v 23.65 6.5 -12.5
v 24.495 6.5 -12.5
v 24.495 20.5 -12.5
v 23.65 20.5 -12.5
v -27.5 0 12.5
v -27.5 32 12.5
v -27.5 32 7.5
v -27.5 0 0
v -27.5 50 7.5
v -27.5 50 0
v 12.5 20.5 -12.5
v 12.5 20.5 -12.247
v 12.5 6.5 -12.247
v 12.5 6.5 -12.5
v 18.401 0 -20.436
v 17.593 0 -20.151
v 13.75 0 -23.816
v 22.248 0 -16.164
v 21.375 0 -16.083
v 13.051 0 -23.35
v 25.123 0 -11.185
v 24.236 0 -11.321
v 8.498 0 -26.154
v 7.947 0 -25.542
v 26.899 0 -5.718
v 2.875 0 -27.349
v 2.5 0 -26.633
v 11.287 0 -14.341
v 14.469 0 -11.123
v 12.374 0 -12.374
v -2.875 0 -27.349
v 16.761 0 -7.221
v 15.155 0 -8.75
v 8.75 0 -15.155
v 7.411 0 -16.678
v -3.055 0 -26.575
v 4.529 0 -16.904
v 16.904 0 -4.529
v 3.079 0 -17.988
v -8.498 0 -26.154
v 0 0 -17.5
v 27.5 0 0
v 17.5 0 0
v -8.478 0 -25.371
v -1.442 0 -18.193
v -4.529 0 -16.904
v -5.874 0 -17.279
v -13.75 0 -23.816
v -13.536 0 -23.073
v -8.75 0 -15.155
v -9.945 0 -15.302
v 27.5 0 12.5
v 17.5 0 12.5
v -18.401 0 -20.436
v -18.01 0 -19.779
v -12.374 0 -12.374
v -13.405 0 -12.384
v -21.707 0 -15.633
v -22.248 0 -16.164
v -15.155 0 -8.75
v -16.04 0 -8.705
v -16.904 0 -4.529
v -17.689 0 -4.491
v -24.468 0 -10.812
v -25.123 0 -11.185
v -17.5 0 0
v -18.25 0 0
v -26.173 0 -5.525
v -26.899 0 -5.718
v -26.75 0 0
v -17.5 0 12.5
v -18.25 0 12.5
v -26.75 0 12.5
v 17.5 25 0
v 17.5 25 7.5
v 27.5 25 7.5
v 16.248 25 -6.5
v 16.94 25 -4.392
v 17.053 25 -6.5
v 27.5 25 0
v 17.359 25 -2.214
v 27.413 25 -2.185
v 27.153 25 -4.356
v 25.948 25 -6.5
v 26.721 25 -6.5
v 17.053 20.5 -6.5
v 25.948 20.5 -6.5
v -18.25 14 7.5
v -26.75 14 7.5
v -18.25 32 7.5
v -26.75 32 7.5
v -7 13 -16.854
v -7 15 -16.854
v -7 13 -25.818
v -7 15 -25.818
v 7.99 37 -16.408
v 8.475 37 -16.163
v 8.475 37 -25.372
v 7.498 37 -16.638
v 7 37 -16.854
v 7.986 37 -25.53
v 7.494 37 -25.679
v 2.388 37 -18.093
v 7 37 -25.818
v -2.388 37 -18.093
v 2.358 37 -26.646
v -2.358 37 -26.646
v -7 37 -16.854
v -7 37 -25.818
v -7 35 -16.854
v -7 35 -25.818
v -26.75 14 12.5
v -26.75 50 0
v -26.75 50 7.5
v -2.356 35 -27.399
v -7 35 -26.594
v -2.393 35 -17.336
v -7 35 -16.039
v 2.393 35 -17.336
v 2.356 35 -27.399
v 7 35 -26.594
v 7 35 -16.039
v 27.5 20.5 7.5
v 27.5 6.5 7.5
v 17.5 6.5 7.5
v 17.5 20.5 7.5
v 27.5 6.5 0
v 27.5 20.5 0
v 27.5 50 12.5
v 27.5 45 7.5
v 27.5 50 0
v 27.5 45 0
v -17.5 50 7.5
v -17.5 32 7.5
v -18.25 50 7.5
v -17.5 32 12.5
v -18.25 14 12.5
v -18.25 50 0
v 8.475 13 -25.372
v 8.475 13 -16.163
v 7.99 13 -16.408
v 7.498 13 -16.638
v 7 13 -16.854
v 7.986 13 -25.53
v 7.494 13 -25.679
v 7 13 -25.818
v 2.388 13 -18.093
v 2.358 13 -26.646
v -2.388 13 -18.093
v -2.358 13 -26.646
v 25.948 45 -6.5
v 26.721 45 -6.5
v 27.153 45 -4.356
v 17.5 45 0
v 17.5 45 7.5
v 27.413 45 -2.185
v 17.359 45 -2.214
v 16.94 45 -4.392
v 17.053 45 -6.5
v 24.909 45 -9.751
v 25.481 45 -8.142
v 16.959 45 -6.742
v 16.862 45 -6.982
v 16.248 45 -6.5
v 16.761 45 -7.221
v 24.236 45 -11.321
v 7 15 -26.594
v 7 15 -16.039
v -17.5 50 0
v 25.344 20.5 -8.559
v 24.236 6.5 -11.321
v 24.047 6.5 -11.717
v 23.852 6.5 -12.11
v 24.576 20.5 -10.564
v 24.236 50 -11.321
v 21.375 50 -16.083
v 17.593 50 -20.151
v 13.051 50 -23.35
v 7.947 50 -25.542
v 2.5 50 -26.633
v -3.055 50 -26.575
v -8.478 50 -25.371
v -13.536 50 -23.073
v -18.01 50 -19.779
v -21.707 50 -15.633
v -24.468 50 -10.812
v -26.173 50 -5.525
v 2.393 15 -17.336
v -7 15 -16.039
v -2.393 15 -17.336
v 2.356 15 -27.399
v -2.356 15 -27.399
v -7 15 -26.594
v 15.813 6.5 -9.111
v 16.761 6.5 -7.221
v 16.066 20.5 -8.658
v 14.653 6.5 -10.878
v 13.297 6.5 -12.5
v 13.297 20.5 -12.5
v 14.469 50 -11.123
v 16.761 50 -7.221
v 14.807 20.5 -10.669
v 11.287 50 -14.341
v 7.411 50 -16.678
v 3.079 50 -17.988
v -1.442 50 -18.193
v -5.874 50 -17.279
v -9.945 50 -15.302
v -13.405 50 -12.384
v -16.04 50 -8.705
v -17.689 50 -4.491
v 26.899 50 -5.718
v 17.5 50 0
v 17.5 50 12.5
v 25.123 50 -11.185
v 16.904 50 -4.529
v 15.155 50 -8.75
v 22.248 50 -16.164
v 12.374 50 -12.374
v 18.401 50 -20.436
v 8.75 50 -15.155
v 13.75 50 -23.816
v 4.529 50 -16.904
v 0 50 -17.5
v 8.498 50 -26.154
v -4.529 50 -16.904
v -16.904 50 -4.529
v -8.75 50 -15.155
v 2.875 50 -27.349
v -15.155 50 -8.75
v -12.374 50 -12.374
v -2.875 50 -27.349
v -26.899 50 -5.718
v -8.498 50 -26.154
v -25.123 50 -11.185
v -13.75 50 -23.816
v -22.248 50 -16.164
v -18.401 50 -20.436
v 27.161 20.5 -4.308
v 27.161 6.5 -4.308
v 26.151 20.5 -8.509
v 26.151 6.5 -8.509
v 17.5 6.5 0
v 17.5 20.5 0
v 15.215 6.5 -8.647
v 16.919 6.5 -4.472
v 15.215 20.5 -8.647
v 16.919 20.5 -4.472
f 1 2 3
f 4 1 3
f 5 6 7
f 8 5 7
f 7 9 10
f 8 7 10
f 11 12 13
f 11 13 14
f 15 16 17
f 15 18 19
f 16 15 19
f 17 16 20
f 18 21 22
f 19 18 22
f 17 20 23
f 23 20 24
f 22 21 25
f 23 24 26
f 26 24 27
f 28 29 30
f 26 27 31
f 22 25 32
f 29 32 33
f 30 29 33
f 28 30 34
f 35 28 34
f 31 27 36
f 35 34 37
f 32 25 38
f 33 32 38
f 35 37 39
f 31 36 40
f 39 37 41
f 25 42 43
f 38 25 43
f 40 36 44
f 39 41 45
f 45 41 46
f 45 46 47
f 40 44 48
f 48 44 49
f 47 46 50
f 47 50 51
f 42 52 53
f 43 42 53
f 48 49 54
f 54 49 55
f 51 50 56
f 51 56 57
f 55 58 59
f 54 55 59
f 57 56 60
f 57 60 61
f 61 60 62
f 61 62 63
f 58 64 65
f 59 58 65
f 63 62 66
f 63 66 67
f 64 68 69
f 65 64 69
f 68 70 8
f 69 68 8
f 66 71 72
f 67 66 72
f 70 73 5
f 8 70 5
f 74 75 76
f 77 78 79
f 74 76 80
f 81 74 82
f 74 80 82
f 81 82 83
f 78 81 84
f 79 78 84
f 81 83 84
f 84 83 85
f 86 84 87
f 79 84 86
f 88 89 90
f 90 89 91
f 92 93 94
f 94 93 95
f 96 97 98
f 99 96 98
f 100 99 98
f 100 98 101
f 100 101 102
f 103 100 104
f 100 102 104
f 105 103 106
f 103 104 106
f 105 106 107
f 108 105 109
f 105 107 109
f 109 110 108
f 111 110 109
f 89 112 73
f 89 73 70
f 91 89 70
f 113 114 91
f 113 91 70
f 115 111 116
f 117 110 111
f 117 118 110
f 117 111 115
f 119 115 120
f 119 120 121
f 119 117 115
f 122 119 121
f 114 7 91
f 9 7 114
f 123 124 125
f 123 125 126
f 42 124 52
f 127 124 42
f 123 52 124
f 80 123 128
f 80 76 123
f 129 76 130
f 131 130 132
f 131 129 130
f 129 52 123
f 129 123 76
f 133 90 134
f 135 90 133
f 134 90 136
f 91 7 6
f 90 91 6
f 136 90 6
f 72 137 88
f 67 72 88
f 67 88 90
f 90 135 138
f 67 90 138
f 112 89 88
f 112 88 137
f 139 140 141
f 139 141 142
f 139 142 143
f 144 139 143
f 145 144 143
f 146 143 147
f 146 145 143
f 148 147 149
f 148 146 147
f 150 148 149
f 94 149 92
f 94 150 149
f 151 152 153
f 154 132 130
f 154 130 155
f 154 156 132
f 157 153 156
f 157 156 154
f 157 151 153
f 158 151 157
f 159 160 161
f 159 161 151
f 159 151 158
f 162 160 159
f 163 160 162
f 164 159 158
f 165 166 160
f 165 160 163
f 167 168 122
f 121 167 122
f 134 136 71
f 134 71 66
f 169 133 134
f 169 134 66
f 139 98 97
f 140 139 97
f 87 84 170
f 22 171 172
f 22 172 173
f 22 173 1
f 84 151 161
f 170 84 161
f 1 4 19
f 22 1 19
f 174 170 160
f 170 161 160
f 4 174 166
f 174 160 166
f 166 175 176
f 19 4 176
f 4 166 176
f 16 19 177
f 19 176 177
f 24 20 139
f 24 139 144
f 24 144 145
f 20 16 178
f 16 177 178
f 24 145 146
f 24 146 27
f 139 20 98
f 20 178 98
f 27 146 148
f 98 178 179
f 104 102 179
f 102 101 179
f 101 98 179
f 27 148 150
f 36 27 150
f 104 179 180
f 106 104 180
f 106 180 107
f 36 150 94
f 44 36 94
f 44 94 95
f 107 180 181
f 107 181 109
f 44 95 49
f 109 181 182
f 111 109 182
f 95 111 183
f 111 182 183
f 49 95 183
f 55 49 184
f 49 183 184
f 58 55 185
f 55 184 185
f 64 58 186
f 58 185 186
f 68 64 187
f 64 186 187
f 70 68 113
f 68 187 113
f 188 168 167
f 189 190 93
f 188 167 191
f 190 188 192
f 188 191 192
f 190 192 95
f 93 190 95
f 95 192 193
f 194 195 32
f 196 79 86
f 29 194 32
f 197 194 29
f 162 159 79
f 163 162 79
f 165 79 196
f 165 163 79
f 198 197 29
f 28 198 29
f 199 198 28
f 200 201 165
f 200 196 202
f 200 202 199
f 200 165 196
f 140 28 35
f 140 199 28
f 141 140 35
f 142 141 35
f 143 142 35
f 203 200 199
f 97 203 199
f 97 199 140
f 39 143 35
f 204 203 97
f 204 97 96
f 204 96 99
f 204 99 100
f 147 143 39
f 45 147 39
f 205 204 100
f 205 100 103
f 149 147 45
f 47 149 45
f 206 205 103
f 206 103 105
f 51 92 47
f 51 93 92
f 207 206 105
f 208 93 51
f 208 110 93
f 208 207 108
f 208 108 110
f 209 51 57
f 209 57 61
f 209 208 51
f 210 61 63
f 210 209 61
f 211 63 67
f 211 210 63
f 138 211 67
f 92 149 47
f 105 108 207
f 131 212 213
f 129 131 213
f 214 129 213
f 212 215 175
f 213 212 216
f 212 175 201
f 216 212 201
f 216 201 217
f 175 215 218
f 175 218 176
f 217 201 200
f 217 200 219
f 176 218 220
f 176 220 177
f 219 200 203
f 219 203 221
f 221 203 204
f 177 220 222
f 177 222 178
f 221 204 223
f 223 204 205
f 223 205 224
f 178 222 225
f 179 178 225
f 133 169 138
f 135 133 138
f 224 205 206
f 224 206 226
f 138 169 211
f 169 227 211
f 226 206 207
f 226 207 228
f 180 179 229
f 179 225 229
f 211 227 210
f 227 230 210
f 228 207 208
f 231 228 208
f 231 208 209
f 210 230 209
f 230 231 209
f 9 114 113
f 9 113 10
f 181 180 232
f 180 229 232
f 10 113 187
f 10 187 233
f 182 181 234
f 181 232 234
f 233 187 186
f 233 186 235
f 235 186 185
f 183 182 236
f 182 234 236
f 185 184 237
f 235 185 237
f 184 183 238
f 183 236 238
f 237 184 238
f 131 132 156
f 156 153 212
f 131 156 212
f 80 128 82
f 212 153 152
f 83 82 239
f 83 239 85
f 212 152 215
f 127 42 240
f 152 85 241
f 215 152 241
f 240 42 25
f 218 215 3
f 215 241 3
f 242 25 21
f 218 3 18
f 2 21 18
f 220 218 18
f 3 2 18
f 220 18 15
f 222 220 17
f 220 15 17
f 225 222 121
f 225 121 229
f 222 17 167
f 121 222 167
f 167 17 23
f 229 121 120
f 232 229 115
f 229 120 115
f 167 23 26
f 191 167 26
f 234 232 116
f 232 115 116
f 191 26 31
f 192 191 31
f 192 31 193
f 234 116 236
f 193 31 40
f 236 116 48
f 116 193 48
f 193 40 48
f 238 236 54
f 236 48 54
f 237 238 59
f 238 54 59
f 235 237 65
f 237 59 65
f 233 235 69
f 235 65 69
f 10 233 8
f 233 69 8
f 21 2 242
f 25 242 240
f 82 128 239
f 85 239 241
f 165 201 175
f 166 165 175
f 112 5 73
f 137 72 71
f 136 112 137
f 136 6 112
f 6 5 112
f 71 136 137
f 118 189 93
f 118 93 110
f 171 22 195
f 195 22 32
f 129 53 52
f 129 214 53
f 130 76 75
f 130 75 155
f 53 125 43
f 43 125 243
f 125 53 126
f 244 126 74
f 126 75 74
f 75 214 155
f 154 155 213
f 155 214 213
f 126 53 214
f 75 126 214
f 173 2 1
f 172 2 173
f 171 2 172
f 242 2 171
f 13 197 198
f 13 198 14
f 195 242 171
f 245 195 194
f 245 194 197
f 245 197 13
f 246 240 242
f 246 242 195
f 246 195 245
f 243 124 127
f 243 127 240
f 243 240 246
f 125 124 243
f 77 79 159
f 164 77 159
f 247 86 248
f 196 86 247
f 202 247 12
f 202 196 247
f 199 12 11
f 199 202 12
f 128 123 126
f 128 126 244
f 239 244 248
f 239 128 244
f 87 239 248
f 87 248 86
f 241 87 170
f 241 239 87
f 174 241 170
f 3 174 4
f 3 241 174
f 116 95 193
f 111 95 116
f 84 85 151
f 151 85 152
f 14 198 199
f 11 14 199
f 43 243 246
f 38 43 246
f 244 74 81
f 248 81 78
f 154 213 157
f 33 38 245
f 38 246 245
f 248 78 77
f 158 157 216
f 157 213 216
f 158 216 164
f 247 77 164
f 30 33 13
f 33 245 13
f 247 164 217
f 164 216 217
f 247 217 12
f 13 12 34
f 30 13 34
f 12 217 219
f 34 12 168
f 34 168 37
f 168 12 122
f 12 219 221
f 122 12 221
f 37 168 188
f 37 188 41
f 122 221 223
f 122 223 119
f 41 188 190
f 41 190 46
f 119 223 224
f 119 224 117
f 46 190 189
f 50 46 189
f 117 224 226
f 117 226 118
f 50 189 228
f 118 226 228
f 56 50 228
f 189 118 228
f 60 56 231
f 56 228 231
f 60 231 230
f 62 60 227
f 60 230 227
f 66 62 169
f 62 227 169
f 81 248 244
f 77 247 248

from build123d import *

# Parameters (mm, degrees)
SKETCH2_R            = 27.5
BOSS_EXTRUDE1_DEPTH  = 50
SKETCH3_R            = 26.75
CUT_EXTRUDE1_DEPTH   = 51
SKETCH7_R            = 18.25
BOSS_EXTRUDE3_DEPTH  = 50
SKETCH8_R            = 17.5
CUT_EXTRUDE3_DEPTH   = 51
SKETCH9_W            = 59.961193285
SKETCH9_H            = 28.516087398
CUT_EXTRUDE4_DEPTH   = 51
SKETCH10_W           = 0.75
SKETCH10_H           = 12.5
BOSS_EXTRUDE4_DEPTH  = 50
BOSS_EXTRUDE5_DEPTH  = 5
BOSS_EXTRUDE6_DEPTH  = 6.5
SKETCH12_W           = 14
SKETCH12_H           = 20
SKETCH12_W_2         = 20
SKETCH12_H_2         = 14
CUT_EXTRUDE6_DEPTH   = 15
SKETCH14_W           = 14
SKETCH14_H           = 20
CUT_EXTRUDE7_DEPTH   = 45
SKETCH15_W           = 16.605878589
SKETCH15_H           = 22.2356131
CUT_EXTRUDE8_DEPTH   = 15
BOSS_EXTRUDE8_DEPTH  = 4.5
BOSS_EXTRUDE9_DEPTH  = 2
BOSS_EXTRUDE10_DEPTH = 2
BOSS_EXTRUDE15_DEPTH = 24
BOSS_EXTRUDE17_DEPTH = 10
SKETCH26_W           = 5
SKETCH26_H           = 18
BOSS_EXTRUDE18_DEPTH = 10
SKETCH27_W           = 8.5
SKETCH27_H           = 14
BOSS_EXTRUDE19_DEPTH = 5


with BuildPart() as part:
    # Sketch2 → Boss-Extrude1 (new body)
    with BuildSketch(Plane(origin=(0, 0, 0), x_dir=(1, 0, 0), z_dir=(0, 1, 0))):
        Circle(SKETCH2_R)
    extrude(amount=BOSS_EXTRUDE1_DEPTH)

    # Sketch3 → Cut-Extrude1 (cut, through all)
    with BuildSketch(Plane(origin=(0, 50, 0), x_dir=(1, 0, 0), z_dir=(0, 1, 0))):
        Circle(SKETCH3_R)
    extrude(amount=-CUT_EXTRUDE1_DEPTH, mode=Mode.SUBTRACT)


with BuildPart() as body_2:
    # Sketch7 → Boss-Extrude3 (new body)
    with BuildSketch(Plane(origin=(0, 50, 0), x_dir=(1, 0, 0), z_dir=(0, 1, 0))):
        Circle(SKETCH7_R)
    extrude(amount=-BOSS_EXTRUDE3_DEPTH)

    # Sketch8 → Cut-Extrude3 (cut, through all)
    with BuildSketch(Plane(origin=(0, 50, 0), x_dir=(1, 0, 0), z_dir=(0, 1, 0))):
        Circle(SKETCH8_R)
    extrude(amount=-CUT_EXTRUDE3_DEPTH, mode=Mode.SUBTRACT)


with BuildPart() as cut_extrude4_tool:
    # Sketch9 → Cut-Extrude4 (new body, through all)
    with BuildSketch(Plane(origin=(0, 50, 0), x_dir=(1, 0, 0), z_dir=(0, 1, 0))):
        with Locations((-0.477134602, -14.258043699)):
            Rectangle(SKETCH9_W, SKETCH9_H)
    extrude(amount=-CUT_EXTRUDE4_DEPTH)


with BuildPart() as part_1:
    add(part.part)

    # Cut-Extrude4: cut by cut_extrude4_tool
    add(cut_extrude4_tool.part, mode=Mode.SUBTRACT)



with BuildPart() as body_2_1:
    add(body_2.part)

    # Cut-Extrude4: cut by cut_extrude4_tool
    add(cut_extrude4_tool.part, mode=Mode.SUBTRACT)


with BuildPart() as part_2:
    add(part_1.part)

    add(body_2_1.part)  # Boss-Extrude4 merges body 2
    # Sketch10 → Boss-Extrude4 (add)
    with BuildSketch(Plane(origin=(0, 50, 0), x_dir=(1, 0, 0), z_dir=(0, 1, 0))):
        with Locations((-27.125, -6.25)):
            Rectangle(SKETCH10_W, SKETCH10_H)
        with Locations((-17.875, -6.25)):
            Rectangle(SKETCH10_W, SKETCH10_H)
        with Locations((17.875, -6.25)):
            Rectangle(SKETCH10_W, SKETCH10_H)
        with Locations((27.125, -6.25)):
            Rectangle(SKETCH10_W, SKETCH10_H)
    extrude(amount=-BOSS_EXTRUDE4_DEPTH)

    # Sketch11 → Boss-Extrude5 (add)
    with BuildSketch(Plane(origin=(0, 50, 0), x_dir=(1, 0, 0), z_dir=(0, 1, 0))):
        with BuildLine():
            Line((16.760723177, 7.220848882), (24.236408431, 11.320733473))
            ThreePointArc((24.236408431, 11.320733473), (26.114042444, 5.798214142), (26.75, 0))
            Line((26.75, 0), (26.75, -12.5))
            Line((26.75, -12.5), (18.25, -12.5))
            Line((18.25, -12.5), (18.25, 0))
            ThreePointArc((18.25, 0), (17.873803428, 3.686414384), (16.760723177, 7.220848882))
        make_face()
    extrude(amount=-BOSS_EXTRUDE5_DEPTH)

    # Sketch13 → Boss-Extrude6 (add)
    with BuildSketch(Plane.XZ):
        with BuildLine():
            Line((18.25, 0), (18.25, 12.5))
            Line((18.25, 12.5), (26.75, 12.5))
            Line((26.75, 12.5), (26.75, 0))
            ThreePointArc((26.75, 0), (26.114042444, -5.798214142), (24.236408431, -11.320733473))
            Line((24.236408431, -11.320733473), (16.760723177, -7.220848882))
            ThreePointArc((16.760723177, -7.220848882), (17.873803428, -3.686414384), (18.25, 0))
        make_face()
    extrude(amount=-BOSS_EXTRUDE6_DEPTH)

    # Sketch12 → Cut-Extrude6 (cut)
    with BuildSketch(Plane(origin=(27.5, 0, 0), x_dir=(0, 0, -1), z_dir=(1, 0, 0))):
        with Locations((-0.5, 35)):
            Rectangle(SKETCH12_W, SKETCH12_H)
        with Locations((2.5, 13.5)):
            Rectangle(SKETCH12_W_2, SKETCH12_H_2)
    extrude(amount=-CUT_EXTRUDE6_DEPTH, mode=Mode.SUBTRACT)

    # Sketch14 → Cut-Extrude7 (cut)
    with BuildSketch(Plane.XY.offset(12.5)):
        with Locations((0, 25)):
            Rectangle(SKETCH14_W, SKETCH14_H)
    extrude(amount=-CUT_EXTRUDE7_DEPTH, mode=Mode.SUBTRACT)

    # Sketch15 → Cut-Extrude8 (cut)
    with BuildSketch(Plane.ZY.offset(27.5)):
        with Locations((15.802939295, 43.11780655)):
            Rectangle(SKETCH15_W, SKETCH15_H)
    extrude(amount=-CUT_EXTRUDE8_DEPTH, mode=Mode.SUBTRACT)

    # Sketch17 → Boss-Extrude8 (add)
    with BuildSketch(Plane(origin=(0, 25, 0), x_dir=(1, 0, 0), z_dir=(0, 1, 0))):
        with BuildLine():
            Line((26.720778432, 6.5), (17.053225501, 6.5))
            ThreePointArc((17.053225501, 6.5), (17.948312809, 3.304628164), (18.25, 0))
            Line((18.25, 0), (18.25, -7.5))
            Line((18.25, -7.5), (27.5, -7.5))
            Line((27.5, -7.5), (27.5, 0))
            ThreePointArc((27.5, 0), (27.304499692, 3.273270011), (26.720778432, 6.5))
        make_face()
    extrude(amount=-BOSS_EXTRUDE8_DEPTH)

    # Sketch18 → Boss-Extrude9 (add)
    with BuildSketch(Plane.XZ.offset(-35)):
        with BuildLine():
            Line((-7, -16.854153791), (-7, -25.817871717))
            ThreePointArc((-7, -25.817871717), (0, -26.75), (7, -25.817871717))
            Line((7, -25.817871717), (7, -16.854153791))
            ThreePointArc((7, -16.854153791), (0, -18.25), (-7, -16.854153791))
        make_face()
    extrude(amount=-BOSS_EXTRUDE9_DEPTH)

    # Sketch19 → Boss-Extrude10 (add)
    with BuildSketch(Plane(origin=(0, 15, 0), x_dir=(1, 0, 0), z_dir=(0, 1, 0))):
        with BuildLine():
            Line((7, 25.817871717), (7, 16.854153791))
            ThreePointArc((7, 16.854153791), (0, 18.25), (-7, 16.854153791))
            Line((-7, 16.854153791), (-7, 25.817871717))
            ThreePointArc((-7, 25.817871717), (0, 26.75), (7, 25.817871717))
        make_face()
    extrude(amount=-BOSS_EXTRUDE10_DEPTH)

    # Sketch24 → Boss-Extrude15 (add)
    with BuildSketch(Plane(origin=(0, 37, 0), x_dir=(1, 0, 0), z_dir=(0, 1, 0))):
        with BuildLine():
            Line((8.47493115, 25.37199326), (8.47493115, 16.162859957))
            ThreePointArc((8.47493115, 16.162859957), (7.745182071, 16.524970641), (7, 16.854153791))
            Line((7, 16.854153791), (7, 25.817871717))
            ThreePointArc((7, 25.817871717), (7.740676678, 25.605554565), (8.47493115, 25.37199326))
        make_face()
    extrude(amount=-BOSS_EXTRUDE15_DEPTH)

    # Sketch25 → Boss-Extrude17 (add)
    with BuildSketch(Plane(origin=(27.5, 0, 0), x_dir=(0, 0, -1), z_dir=(1, 0, 0))):
        Polygon((-7.5, 45), (-12.5, 45), (-12.5, 25), (-12.5, 20.5), (-7.5, 20.5), (-7.5, 25), align=None)
    extrude(amount=-BOSS_EXTRUDE17_DEPTH)

    # Sketch26 → Boss-Extrude18 (add)
    with BuildSketch(Plane.ZY.offset(27.5)):
        with Locations((10, 23)):
            Rectangle(SKETCH26_W, SKETCH26_H)
    extrude(amount=-BOSS_EXTRUDE18_DEPTH)

    # Sketch27 → Boss-Extrude19 (add)
    with BuildSketch(Plane.XY.offset(12.5)):
        with Locations((22.5, 13.5)):
            Rectangle(SKETCH27_W, SKETCH27_H)
    extrude(amount=-BOSS_EXTRUDE19_DEPTH)


solid = part_2.part
